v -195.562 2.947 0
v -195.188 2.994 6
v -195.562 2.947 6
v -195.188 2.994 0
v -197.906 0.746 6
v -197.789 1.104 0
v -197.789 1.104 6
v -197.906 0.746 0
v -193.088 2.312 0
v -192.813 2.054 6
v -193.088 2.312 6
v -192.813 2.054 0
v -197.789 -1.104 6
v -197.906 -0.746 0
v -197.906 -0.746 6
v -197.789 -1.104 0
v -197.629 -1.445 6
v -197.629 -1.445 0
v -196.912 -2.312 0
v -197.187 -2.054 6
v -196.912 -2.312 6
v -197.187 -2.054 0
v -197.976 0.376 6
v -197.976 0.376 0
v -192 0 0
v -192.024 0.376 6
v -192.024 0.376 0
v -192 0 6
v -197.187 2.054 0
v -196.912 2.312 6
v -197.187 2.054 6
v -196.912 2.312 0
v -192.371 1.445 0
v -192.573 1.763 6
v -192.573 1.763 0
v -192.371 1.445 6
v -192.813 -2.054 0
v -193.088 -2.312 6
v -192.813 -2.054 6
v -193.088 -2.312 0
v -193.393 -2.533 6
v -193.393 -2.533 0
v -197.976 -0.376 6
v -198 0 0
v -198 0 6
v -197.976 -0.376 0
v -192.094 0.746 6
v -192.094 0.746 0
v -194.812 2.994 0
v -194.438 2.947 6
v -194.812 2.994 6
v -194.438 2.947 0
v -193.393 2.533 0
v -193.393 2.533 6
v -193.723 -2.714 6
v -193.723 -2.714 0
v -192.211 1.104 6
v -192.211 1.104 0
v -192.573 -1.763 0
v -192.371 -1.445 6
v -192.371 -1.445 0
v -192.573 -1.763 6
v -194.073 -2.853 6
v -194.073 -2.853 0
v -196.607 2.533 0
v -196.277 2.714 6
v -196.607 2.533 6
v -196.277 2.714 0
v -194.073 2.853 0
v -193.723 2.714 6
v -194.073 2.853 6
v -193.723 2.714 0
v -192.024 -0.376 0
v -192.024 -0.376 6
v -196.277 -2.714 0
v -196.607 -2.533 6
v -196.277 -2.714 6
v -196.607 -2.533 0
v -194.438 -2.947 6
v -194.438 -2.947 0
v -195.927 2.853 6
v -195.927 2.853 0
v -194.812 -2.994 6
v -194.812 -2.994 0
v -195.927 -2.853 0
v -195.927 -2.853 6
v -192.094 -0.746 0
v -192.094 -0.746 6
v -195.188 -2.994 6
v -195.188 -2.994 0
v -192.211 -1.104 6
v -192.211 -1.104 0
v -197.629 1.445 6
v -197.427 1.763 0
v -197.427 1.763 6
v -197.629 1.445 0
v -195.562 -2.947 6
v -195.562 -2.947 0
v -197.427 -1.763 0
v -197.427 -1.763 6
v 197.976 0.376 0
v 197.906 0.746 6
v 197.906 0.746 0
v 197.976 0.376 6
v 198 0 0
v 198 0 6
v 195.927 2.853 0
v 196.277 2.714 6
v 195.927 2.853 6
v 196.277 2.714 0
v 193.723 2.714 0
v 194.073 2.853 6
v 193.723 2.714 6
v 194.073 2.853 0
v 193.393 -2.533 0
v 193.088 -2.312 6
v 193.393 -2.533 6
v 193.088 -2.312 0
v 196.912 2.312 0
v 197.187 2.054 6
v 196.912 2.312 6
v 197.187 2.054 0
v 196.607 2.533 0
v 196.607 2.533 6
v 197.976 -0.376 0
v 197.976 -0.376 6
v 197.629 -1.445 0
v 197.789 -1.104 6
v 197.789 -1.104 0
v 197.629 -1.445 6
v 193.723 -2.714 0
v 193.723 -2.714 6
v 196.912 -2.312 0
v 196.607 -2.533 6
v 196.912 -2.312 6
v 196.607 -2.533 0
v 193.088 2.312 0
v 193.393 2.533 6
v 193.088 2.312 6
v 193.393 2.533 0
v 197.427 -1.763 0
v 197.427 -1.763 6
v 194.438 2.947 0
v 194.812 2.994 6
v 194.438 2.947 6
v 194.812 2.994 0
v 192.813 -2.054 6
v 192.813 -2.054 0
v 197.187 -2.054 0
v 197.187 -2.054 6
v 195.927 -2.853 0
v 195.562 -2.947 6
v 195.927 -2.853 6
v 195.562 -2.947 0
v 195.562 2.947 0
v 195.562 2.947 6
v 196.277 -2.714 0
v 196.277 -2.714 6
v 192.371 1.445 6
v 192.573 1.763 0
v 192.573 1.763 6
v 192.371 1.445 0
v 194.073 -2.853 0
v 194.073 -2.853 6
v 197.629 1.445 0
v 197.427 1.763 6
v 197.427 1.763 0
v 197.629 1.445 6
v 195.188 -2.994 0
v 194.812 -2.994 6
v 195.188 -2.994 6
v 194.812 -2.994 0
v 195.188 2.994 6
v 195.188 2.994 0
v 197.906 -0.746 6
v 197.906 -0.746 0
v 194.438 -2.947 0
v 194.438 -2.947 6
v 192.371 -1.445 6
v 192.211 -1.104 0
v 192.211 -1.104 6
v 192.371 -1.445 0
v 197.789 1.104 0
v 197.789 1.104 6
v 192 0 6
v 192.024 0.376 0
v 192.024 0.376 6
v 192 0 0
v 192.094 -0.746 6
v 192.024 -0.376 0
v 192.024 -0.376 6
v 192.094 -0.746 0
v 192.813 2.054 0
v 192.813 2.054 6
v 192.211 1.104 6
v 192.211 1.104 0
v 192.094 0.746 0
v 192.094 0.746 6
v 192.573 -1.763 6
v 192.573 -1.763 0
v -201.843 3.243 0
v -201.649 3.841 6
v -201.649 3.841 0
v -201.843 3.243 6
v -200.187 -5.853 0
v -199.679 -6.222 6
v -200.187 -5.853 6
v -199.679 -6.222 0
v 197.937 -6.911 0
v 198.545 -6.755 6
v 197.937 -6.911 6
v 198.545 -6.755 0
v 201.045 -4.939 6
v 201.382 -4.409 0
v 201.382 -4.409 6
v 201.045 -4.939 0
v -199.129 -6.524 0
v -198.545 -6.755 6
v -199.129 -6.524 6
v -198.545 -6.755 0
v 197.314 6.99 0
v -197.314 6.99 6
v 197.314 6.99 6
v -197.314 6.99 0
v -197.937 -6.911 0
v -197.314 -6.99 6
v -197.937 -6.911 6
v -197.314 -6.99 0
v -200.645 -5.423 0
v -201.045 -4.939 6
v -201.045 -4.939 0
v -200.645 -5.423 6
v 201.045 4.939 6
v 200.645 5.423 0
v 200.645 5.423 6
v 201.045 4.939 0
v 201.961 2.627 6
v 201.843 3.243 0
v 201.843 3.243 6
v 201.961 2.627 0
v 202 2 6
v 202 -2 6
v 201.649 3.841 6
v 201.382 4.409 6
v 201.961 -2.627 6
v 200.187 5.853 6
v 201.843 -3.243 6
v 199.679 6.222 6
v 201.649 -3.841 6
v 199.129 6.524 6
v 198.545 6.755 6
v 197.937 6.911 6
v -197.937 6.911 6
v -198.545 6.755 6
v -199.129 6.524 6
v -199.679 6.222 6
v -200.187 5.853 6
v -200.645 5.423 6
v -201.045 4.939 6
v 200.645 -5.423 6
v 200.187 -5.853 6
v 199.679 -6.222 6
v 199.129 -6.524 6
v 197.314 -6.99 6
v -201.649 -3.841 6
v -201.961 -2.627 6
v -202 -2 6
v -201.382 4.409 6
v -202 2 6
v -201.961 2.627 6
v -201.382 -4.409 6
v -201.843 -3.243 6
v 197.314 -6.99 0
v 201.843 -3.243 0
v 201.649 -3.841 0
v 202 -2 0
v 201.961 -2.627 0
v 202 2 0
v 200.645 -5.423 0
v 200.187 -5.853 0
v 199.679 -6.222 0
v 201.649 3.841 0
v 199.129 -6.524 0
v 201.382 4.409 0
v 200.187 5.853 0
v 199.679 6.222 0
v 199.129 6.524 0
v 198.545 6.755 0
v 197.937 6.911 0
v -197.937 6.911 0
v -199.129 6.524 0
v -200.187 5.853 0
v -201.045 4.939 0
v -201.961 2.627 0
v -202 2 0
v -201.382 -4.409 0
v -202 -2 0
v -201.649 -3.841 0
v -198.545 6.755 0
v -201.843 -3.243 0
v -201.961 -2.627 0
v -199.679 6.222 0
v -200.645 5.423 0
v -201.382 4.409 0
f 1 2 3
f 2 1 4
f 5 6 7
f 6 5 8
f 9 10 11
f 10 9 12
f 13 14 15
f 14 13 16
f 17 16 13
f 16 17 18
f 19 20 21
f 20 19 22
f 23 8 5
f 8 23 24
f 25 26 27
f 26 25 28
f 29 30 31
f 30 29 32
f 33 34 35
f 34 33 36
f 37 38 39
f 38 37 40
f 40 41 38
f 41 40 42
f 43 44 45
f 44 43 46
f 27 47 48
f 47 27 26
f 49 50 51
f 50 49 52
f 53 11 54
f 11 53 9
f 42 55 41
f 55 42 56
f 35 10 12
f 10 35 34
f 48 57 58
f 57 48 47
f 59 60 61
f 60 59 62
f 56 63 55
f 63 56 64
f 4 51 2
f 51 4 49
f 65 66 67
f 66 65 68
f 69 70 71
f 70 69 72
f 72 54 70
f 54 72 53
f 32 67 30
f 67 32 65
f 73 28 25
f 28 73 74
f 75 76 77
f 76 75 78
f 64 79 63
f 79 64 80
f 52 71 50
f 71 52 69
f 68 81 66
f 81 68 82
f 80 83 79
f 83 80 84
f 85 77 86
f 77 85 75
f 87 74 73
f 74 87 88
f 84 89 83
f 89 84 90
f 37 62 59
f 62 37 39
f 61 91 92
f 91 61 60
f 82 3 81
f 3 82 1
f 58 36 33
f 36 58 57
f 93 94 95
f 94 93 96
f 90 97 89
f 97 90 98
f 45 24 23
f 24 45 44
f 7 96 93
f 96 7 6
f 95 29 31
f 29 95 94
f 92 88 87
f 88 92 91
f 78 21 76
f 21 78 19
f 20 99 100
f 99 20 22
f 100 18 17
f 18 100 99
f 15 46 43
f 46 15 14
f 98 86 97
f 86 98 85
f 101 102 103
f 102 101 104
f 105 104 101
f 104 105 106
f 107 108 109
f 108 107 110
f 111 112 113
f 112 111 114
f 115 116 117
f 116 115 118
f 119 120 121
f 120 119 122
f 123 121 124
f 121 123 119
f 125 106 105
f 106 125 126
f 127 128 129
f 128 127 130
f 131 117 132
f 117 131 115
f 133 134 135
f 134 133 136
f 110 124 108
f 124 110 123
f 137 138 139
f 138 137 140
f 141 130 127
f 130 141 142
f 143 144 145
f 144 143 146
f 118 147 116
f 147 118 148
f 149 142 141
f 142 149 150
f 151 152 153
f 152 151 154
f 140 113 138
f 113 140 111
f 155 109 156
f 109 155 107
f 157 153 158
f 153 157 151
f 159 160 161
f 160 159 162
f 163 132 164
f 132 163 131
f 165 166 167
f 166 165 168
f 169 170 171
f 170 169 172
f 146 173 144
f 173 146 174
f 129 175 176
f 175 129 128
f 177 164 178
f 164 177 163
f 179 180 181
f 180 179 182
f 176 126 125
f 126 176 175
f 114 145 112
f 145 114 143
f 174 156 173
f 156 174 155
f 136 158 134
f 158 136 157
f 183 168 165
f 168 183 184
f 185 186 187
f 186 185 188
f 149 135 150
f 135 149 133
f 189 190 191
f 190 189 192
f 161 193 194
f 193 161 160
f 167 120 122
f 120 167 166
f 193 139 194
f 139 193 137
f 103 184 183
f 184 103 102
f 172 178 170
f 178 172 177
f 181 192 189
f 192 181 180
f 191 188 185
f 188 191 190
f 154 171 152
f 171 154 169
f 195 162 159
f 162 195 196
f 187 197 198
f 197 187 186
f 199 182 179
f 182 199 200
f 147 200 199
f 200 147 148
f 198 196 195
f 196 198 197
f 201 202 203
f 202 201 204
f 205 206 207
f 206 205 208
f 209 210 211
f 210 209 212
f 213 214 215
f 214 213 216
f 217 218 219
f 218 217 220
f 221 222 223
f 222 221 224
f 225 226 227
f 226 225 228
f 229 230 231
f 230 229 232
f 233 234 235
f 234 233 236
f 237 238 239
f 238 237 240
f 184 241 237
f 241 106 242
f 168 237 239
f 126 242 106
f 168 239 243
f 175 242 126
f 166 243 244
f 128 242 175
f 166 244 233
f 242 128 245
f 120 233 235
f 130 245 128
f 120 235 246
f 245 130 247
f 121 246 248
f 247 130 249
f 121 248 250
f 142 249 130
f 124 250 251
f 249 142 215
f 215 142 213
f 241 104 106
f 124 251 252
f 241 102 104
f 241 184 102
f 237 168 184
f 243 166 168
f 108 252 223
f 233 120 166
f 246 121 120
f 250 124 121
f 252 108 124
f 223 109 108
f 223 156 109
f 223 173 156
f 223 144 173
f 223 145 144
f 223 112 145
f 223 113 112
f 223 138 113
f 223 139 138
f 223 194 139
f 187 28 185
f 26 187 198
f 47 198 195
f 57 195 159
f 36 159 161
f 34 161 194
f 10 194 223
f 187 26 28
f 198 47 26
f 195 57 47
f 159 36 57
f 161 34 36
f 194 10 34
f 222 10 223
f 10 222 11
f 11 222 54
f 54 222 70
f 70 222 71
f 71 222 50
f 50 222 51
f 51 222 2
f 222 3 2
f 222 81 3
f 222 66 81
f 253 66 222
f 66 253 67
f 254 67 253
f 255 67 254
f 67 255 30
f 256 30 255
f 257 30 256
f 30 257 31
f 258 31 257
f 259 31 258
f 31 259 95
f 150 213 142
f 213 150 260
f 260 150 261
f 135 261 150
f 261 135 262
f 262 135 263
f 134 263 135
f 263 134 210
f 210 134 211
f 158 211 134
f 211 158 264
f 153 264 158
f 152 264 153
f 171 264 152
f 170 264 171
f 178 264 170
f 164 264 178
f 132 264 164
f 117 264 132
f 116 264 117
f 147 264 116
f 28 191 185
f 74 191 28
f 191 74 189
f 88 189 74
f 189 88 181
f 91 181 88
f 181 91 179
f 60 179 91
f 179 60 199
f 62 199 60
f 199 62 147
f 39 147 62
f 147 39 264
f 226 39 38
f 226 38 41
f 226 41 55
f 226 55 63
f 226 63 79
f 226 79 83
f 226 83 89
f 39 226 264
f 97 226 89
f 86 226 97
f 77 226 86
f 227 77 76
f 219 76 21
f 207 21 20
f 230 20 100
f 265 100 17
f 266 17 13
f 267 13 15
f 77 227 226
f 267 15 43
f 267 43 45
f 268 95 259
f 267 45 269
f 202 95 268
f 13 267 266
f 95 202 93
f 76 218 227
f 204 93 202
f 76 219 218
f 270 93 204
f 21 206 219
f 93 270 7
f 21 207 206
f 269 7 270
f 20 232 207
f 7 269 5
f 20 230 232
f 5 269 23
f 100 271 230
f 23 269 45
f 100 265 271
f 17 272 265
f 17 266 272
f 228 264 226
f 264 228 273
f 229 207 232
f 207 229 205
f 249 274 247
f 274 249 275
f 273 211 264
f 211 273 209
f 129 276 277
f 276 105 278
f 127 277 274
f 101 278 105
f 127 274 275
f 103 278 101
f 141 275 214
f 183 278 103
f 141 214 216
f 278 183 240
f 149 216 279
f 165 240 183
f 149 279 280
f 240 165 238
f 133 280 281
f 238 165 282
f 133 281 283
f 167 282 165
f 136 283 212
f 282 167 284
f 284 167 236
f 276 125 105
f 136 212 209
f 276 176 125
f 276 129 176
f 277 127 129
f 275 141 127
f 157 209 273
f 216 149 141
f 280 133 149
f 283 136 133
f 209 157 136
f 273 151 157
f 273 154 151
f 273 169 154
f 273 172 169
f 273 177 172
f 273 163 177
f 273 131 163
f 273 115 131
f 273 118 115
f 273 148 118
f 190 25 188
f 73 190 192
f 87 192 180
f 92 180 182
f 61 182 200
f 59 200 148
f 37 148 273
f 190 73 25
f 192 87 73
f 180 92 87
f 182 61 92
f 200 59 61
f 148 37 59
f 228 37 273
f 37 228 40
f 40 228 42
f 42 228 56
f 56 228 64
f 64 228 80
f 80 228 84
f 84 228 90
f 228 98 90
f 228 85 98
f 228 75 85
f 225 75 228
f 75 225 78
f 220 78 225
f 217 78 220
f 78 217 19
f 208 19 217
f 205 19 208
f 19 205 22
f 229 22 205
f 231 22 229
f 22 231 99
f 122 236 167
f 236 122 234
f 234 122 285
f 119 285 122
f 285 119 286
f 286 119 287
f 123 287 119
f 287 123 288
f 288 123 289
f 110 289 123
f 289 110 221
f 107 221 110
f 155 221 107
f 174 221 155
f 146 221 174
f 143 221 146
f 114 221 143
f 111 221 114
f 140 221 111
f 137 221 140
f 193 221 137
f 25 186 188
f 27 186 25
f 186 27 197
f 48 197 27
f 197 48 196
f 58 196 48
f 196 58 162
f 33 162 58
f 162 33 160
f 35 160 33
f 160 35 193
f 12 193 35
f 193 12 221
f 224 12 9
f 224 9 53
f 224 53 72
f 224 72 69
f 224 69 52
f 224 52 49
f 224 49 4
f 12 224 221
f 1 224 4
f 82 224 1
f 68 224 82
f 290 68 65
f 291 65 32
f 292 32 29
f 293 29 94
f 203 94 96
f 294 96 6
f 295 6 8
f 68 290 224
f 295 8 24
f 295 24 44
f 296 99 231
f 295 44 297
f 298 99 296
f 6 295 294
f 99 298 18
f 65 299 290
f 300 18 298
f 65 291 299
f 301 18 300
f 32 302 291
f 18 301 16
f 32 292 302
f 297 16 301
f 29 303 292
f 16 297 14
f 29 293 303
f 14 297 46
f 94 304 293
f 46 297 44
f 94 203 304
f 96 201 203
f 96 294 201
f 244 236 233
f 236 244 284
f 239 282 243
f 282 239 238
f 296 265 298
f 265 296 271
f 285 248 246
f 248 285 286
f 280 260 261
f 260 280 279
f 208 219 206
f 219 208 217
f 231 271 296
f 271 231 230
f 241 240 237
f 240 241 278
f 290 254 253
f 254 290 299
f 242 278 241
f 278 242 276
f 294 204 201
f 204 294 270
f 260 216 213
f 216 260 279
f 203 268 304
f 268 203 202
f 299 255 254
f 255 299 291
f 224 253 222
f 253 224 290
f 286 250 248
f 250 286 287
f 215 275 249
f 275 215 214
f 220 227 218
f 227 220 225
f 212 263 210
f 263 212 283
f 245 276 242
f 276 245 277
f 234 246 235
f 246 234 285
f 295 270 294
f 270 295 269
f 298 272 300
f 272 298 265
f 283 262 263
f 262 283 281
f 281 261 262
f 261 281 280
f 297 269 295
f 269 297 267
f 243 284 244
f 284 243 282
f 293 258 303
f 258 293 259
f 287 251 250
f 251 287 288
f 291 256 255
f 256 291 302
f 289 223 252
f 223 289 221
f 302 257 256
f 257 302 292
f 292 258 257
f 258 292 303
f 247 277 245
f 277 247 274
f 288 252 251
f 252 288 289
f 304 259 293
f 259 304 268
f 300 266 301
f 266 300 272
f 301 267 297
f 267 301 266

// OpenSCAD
$fn = 50;


difference() {
	union() {
		hull() {
			translate(v = [-197.0000000000, 2.0000000000, 0]) {
				cylinder(h = 6, r = 5);
			}
			translate(v = [197.0000000000, 2.0000000000, 0]) {
				cylinder(h = 6, r = 5);
			}
			translate(v = [-197.0000000000, -2.0000000000, 0]) {
				cylinder(h = 6, r = 5);
			}
			translate(v = [197.0000000000, -2.0000000000, 0]) {
				cylinder(h = 6, r = 5);
			}
		}
	}
	union() {
		translate(v = [-195.0000000000, 0.0000000000, -100.0000000000]) {
			cylinder(h = 200, r = 3.0000000000);
		}
		translate(v = [-195.0000000000, 0.0000000000, -100.0000000000]) {
			cylinder(h = 200, r = 3.0000000000);
		}
		translate(v = [195.0000000000, 0.0000000000, -100.0000000000]) {
			cylinder(h = 200, r = 3.0000000000);
		}
		translate(v = [195.0000000000, 0.0000000000, -100.0000000000]) {
			cylinder(h = 200, r = 3.0000000000);
		}
	}
}
